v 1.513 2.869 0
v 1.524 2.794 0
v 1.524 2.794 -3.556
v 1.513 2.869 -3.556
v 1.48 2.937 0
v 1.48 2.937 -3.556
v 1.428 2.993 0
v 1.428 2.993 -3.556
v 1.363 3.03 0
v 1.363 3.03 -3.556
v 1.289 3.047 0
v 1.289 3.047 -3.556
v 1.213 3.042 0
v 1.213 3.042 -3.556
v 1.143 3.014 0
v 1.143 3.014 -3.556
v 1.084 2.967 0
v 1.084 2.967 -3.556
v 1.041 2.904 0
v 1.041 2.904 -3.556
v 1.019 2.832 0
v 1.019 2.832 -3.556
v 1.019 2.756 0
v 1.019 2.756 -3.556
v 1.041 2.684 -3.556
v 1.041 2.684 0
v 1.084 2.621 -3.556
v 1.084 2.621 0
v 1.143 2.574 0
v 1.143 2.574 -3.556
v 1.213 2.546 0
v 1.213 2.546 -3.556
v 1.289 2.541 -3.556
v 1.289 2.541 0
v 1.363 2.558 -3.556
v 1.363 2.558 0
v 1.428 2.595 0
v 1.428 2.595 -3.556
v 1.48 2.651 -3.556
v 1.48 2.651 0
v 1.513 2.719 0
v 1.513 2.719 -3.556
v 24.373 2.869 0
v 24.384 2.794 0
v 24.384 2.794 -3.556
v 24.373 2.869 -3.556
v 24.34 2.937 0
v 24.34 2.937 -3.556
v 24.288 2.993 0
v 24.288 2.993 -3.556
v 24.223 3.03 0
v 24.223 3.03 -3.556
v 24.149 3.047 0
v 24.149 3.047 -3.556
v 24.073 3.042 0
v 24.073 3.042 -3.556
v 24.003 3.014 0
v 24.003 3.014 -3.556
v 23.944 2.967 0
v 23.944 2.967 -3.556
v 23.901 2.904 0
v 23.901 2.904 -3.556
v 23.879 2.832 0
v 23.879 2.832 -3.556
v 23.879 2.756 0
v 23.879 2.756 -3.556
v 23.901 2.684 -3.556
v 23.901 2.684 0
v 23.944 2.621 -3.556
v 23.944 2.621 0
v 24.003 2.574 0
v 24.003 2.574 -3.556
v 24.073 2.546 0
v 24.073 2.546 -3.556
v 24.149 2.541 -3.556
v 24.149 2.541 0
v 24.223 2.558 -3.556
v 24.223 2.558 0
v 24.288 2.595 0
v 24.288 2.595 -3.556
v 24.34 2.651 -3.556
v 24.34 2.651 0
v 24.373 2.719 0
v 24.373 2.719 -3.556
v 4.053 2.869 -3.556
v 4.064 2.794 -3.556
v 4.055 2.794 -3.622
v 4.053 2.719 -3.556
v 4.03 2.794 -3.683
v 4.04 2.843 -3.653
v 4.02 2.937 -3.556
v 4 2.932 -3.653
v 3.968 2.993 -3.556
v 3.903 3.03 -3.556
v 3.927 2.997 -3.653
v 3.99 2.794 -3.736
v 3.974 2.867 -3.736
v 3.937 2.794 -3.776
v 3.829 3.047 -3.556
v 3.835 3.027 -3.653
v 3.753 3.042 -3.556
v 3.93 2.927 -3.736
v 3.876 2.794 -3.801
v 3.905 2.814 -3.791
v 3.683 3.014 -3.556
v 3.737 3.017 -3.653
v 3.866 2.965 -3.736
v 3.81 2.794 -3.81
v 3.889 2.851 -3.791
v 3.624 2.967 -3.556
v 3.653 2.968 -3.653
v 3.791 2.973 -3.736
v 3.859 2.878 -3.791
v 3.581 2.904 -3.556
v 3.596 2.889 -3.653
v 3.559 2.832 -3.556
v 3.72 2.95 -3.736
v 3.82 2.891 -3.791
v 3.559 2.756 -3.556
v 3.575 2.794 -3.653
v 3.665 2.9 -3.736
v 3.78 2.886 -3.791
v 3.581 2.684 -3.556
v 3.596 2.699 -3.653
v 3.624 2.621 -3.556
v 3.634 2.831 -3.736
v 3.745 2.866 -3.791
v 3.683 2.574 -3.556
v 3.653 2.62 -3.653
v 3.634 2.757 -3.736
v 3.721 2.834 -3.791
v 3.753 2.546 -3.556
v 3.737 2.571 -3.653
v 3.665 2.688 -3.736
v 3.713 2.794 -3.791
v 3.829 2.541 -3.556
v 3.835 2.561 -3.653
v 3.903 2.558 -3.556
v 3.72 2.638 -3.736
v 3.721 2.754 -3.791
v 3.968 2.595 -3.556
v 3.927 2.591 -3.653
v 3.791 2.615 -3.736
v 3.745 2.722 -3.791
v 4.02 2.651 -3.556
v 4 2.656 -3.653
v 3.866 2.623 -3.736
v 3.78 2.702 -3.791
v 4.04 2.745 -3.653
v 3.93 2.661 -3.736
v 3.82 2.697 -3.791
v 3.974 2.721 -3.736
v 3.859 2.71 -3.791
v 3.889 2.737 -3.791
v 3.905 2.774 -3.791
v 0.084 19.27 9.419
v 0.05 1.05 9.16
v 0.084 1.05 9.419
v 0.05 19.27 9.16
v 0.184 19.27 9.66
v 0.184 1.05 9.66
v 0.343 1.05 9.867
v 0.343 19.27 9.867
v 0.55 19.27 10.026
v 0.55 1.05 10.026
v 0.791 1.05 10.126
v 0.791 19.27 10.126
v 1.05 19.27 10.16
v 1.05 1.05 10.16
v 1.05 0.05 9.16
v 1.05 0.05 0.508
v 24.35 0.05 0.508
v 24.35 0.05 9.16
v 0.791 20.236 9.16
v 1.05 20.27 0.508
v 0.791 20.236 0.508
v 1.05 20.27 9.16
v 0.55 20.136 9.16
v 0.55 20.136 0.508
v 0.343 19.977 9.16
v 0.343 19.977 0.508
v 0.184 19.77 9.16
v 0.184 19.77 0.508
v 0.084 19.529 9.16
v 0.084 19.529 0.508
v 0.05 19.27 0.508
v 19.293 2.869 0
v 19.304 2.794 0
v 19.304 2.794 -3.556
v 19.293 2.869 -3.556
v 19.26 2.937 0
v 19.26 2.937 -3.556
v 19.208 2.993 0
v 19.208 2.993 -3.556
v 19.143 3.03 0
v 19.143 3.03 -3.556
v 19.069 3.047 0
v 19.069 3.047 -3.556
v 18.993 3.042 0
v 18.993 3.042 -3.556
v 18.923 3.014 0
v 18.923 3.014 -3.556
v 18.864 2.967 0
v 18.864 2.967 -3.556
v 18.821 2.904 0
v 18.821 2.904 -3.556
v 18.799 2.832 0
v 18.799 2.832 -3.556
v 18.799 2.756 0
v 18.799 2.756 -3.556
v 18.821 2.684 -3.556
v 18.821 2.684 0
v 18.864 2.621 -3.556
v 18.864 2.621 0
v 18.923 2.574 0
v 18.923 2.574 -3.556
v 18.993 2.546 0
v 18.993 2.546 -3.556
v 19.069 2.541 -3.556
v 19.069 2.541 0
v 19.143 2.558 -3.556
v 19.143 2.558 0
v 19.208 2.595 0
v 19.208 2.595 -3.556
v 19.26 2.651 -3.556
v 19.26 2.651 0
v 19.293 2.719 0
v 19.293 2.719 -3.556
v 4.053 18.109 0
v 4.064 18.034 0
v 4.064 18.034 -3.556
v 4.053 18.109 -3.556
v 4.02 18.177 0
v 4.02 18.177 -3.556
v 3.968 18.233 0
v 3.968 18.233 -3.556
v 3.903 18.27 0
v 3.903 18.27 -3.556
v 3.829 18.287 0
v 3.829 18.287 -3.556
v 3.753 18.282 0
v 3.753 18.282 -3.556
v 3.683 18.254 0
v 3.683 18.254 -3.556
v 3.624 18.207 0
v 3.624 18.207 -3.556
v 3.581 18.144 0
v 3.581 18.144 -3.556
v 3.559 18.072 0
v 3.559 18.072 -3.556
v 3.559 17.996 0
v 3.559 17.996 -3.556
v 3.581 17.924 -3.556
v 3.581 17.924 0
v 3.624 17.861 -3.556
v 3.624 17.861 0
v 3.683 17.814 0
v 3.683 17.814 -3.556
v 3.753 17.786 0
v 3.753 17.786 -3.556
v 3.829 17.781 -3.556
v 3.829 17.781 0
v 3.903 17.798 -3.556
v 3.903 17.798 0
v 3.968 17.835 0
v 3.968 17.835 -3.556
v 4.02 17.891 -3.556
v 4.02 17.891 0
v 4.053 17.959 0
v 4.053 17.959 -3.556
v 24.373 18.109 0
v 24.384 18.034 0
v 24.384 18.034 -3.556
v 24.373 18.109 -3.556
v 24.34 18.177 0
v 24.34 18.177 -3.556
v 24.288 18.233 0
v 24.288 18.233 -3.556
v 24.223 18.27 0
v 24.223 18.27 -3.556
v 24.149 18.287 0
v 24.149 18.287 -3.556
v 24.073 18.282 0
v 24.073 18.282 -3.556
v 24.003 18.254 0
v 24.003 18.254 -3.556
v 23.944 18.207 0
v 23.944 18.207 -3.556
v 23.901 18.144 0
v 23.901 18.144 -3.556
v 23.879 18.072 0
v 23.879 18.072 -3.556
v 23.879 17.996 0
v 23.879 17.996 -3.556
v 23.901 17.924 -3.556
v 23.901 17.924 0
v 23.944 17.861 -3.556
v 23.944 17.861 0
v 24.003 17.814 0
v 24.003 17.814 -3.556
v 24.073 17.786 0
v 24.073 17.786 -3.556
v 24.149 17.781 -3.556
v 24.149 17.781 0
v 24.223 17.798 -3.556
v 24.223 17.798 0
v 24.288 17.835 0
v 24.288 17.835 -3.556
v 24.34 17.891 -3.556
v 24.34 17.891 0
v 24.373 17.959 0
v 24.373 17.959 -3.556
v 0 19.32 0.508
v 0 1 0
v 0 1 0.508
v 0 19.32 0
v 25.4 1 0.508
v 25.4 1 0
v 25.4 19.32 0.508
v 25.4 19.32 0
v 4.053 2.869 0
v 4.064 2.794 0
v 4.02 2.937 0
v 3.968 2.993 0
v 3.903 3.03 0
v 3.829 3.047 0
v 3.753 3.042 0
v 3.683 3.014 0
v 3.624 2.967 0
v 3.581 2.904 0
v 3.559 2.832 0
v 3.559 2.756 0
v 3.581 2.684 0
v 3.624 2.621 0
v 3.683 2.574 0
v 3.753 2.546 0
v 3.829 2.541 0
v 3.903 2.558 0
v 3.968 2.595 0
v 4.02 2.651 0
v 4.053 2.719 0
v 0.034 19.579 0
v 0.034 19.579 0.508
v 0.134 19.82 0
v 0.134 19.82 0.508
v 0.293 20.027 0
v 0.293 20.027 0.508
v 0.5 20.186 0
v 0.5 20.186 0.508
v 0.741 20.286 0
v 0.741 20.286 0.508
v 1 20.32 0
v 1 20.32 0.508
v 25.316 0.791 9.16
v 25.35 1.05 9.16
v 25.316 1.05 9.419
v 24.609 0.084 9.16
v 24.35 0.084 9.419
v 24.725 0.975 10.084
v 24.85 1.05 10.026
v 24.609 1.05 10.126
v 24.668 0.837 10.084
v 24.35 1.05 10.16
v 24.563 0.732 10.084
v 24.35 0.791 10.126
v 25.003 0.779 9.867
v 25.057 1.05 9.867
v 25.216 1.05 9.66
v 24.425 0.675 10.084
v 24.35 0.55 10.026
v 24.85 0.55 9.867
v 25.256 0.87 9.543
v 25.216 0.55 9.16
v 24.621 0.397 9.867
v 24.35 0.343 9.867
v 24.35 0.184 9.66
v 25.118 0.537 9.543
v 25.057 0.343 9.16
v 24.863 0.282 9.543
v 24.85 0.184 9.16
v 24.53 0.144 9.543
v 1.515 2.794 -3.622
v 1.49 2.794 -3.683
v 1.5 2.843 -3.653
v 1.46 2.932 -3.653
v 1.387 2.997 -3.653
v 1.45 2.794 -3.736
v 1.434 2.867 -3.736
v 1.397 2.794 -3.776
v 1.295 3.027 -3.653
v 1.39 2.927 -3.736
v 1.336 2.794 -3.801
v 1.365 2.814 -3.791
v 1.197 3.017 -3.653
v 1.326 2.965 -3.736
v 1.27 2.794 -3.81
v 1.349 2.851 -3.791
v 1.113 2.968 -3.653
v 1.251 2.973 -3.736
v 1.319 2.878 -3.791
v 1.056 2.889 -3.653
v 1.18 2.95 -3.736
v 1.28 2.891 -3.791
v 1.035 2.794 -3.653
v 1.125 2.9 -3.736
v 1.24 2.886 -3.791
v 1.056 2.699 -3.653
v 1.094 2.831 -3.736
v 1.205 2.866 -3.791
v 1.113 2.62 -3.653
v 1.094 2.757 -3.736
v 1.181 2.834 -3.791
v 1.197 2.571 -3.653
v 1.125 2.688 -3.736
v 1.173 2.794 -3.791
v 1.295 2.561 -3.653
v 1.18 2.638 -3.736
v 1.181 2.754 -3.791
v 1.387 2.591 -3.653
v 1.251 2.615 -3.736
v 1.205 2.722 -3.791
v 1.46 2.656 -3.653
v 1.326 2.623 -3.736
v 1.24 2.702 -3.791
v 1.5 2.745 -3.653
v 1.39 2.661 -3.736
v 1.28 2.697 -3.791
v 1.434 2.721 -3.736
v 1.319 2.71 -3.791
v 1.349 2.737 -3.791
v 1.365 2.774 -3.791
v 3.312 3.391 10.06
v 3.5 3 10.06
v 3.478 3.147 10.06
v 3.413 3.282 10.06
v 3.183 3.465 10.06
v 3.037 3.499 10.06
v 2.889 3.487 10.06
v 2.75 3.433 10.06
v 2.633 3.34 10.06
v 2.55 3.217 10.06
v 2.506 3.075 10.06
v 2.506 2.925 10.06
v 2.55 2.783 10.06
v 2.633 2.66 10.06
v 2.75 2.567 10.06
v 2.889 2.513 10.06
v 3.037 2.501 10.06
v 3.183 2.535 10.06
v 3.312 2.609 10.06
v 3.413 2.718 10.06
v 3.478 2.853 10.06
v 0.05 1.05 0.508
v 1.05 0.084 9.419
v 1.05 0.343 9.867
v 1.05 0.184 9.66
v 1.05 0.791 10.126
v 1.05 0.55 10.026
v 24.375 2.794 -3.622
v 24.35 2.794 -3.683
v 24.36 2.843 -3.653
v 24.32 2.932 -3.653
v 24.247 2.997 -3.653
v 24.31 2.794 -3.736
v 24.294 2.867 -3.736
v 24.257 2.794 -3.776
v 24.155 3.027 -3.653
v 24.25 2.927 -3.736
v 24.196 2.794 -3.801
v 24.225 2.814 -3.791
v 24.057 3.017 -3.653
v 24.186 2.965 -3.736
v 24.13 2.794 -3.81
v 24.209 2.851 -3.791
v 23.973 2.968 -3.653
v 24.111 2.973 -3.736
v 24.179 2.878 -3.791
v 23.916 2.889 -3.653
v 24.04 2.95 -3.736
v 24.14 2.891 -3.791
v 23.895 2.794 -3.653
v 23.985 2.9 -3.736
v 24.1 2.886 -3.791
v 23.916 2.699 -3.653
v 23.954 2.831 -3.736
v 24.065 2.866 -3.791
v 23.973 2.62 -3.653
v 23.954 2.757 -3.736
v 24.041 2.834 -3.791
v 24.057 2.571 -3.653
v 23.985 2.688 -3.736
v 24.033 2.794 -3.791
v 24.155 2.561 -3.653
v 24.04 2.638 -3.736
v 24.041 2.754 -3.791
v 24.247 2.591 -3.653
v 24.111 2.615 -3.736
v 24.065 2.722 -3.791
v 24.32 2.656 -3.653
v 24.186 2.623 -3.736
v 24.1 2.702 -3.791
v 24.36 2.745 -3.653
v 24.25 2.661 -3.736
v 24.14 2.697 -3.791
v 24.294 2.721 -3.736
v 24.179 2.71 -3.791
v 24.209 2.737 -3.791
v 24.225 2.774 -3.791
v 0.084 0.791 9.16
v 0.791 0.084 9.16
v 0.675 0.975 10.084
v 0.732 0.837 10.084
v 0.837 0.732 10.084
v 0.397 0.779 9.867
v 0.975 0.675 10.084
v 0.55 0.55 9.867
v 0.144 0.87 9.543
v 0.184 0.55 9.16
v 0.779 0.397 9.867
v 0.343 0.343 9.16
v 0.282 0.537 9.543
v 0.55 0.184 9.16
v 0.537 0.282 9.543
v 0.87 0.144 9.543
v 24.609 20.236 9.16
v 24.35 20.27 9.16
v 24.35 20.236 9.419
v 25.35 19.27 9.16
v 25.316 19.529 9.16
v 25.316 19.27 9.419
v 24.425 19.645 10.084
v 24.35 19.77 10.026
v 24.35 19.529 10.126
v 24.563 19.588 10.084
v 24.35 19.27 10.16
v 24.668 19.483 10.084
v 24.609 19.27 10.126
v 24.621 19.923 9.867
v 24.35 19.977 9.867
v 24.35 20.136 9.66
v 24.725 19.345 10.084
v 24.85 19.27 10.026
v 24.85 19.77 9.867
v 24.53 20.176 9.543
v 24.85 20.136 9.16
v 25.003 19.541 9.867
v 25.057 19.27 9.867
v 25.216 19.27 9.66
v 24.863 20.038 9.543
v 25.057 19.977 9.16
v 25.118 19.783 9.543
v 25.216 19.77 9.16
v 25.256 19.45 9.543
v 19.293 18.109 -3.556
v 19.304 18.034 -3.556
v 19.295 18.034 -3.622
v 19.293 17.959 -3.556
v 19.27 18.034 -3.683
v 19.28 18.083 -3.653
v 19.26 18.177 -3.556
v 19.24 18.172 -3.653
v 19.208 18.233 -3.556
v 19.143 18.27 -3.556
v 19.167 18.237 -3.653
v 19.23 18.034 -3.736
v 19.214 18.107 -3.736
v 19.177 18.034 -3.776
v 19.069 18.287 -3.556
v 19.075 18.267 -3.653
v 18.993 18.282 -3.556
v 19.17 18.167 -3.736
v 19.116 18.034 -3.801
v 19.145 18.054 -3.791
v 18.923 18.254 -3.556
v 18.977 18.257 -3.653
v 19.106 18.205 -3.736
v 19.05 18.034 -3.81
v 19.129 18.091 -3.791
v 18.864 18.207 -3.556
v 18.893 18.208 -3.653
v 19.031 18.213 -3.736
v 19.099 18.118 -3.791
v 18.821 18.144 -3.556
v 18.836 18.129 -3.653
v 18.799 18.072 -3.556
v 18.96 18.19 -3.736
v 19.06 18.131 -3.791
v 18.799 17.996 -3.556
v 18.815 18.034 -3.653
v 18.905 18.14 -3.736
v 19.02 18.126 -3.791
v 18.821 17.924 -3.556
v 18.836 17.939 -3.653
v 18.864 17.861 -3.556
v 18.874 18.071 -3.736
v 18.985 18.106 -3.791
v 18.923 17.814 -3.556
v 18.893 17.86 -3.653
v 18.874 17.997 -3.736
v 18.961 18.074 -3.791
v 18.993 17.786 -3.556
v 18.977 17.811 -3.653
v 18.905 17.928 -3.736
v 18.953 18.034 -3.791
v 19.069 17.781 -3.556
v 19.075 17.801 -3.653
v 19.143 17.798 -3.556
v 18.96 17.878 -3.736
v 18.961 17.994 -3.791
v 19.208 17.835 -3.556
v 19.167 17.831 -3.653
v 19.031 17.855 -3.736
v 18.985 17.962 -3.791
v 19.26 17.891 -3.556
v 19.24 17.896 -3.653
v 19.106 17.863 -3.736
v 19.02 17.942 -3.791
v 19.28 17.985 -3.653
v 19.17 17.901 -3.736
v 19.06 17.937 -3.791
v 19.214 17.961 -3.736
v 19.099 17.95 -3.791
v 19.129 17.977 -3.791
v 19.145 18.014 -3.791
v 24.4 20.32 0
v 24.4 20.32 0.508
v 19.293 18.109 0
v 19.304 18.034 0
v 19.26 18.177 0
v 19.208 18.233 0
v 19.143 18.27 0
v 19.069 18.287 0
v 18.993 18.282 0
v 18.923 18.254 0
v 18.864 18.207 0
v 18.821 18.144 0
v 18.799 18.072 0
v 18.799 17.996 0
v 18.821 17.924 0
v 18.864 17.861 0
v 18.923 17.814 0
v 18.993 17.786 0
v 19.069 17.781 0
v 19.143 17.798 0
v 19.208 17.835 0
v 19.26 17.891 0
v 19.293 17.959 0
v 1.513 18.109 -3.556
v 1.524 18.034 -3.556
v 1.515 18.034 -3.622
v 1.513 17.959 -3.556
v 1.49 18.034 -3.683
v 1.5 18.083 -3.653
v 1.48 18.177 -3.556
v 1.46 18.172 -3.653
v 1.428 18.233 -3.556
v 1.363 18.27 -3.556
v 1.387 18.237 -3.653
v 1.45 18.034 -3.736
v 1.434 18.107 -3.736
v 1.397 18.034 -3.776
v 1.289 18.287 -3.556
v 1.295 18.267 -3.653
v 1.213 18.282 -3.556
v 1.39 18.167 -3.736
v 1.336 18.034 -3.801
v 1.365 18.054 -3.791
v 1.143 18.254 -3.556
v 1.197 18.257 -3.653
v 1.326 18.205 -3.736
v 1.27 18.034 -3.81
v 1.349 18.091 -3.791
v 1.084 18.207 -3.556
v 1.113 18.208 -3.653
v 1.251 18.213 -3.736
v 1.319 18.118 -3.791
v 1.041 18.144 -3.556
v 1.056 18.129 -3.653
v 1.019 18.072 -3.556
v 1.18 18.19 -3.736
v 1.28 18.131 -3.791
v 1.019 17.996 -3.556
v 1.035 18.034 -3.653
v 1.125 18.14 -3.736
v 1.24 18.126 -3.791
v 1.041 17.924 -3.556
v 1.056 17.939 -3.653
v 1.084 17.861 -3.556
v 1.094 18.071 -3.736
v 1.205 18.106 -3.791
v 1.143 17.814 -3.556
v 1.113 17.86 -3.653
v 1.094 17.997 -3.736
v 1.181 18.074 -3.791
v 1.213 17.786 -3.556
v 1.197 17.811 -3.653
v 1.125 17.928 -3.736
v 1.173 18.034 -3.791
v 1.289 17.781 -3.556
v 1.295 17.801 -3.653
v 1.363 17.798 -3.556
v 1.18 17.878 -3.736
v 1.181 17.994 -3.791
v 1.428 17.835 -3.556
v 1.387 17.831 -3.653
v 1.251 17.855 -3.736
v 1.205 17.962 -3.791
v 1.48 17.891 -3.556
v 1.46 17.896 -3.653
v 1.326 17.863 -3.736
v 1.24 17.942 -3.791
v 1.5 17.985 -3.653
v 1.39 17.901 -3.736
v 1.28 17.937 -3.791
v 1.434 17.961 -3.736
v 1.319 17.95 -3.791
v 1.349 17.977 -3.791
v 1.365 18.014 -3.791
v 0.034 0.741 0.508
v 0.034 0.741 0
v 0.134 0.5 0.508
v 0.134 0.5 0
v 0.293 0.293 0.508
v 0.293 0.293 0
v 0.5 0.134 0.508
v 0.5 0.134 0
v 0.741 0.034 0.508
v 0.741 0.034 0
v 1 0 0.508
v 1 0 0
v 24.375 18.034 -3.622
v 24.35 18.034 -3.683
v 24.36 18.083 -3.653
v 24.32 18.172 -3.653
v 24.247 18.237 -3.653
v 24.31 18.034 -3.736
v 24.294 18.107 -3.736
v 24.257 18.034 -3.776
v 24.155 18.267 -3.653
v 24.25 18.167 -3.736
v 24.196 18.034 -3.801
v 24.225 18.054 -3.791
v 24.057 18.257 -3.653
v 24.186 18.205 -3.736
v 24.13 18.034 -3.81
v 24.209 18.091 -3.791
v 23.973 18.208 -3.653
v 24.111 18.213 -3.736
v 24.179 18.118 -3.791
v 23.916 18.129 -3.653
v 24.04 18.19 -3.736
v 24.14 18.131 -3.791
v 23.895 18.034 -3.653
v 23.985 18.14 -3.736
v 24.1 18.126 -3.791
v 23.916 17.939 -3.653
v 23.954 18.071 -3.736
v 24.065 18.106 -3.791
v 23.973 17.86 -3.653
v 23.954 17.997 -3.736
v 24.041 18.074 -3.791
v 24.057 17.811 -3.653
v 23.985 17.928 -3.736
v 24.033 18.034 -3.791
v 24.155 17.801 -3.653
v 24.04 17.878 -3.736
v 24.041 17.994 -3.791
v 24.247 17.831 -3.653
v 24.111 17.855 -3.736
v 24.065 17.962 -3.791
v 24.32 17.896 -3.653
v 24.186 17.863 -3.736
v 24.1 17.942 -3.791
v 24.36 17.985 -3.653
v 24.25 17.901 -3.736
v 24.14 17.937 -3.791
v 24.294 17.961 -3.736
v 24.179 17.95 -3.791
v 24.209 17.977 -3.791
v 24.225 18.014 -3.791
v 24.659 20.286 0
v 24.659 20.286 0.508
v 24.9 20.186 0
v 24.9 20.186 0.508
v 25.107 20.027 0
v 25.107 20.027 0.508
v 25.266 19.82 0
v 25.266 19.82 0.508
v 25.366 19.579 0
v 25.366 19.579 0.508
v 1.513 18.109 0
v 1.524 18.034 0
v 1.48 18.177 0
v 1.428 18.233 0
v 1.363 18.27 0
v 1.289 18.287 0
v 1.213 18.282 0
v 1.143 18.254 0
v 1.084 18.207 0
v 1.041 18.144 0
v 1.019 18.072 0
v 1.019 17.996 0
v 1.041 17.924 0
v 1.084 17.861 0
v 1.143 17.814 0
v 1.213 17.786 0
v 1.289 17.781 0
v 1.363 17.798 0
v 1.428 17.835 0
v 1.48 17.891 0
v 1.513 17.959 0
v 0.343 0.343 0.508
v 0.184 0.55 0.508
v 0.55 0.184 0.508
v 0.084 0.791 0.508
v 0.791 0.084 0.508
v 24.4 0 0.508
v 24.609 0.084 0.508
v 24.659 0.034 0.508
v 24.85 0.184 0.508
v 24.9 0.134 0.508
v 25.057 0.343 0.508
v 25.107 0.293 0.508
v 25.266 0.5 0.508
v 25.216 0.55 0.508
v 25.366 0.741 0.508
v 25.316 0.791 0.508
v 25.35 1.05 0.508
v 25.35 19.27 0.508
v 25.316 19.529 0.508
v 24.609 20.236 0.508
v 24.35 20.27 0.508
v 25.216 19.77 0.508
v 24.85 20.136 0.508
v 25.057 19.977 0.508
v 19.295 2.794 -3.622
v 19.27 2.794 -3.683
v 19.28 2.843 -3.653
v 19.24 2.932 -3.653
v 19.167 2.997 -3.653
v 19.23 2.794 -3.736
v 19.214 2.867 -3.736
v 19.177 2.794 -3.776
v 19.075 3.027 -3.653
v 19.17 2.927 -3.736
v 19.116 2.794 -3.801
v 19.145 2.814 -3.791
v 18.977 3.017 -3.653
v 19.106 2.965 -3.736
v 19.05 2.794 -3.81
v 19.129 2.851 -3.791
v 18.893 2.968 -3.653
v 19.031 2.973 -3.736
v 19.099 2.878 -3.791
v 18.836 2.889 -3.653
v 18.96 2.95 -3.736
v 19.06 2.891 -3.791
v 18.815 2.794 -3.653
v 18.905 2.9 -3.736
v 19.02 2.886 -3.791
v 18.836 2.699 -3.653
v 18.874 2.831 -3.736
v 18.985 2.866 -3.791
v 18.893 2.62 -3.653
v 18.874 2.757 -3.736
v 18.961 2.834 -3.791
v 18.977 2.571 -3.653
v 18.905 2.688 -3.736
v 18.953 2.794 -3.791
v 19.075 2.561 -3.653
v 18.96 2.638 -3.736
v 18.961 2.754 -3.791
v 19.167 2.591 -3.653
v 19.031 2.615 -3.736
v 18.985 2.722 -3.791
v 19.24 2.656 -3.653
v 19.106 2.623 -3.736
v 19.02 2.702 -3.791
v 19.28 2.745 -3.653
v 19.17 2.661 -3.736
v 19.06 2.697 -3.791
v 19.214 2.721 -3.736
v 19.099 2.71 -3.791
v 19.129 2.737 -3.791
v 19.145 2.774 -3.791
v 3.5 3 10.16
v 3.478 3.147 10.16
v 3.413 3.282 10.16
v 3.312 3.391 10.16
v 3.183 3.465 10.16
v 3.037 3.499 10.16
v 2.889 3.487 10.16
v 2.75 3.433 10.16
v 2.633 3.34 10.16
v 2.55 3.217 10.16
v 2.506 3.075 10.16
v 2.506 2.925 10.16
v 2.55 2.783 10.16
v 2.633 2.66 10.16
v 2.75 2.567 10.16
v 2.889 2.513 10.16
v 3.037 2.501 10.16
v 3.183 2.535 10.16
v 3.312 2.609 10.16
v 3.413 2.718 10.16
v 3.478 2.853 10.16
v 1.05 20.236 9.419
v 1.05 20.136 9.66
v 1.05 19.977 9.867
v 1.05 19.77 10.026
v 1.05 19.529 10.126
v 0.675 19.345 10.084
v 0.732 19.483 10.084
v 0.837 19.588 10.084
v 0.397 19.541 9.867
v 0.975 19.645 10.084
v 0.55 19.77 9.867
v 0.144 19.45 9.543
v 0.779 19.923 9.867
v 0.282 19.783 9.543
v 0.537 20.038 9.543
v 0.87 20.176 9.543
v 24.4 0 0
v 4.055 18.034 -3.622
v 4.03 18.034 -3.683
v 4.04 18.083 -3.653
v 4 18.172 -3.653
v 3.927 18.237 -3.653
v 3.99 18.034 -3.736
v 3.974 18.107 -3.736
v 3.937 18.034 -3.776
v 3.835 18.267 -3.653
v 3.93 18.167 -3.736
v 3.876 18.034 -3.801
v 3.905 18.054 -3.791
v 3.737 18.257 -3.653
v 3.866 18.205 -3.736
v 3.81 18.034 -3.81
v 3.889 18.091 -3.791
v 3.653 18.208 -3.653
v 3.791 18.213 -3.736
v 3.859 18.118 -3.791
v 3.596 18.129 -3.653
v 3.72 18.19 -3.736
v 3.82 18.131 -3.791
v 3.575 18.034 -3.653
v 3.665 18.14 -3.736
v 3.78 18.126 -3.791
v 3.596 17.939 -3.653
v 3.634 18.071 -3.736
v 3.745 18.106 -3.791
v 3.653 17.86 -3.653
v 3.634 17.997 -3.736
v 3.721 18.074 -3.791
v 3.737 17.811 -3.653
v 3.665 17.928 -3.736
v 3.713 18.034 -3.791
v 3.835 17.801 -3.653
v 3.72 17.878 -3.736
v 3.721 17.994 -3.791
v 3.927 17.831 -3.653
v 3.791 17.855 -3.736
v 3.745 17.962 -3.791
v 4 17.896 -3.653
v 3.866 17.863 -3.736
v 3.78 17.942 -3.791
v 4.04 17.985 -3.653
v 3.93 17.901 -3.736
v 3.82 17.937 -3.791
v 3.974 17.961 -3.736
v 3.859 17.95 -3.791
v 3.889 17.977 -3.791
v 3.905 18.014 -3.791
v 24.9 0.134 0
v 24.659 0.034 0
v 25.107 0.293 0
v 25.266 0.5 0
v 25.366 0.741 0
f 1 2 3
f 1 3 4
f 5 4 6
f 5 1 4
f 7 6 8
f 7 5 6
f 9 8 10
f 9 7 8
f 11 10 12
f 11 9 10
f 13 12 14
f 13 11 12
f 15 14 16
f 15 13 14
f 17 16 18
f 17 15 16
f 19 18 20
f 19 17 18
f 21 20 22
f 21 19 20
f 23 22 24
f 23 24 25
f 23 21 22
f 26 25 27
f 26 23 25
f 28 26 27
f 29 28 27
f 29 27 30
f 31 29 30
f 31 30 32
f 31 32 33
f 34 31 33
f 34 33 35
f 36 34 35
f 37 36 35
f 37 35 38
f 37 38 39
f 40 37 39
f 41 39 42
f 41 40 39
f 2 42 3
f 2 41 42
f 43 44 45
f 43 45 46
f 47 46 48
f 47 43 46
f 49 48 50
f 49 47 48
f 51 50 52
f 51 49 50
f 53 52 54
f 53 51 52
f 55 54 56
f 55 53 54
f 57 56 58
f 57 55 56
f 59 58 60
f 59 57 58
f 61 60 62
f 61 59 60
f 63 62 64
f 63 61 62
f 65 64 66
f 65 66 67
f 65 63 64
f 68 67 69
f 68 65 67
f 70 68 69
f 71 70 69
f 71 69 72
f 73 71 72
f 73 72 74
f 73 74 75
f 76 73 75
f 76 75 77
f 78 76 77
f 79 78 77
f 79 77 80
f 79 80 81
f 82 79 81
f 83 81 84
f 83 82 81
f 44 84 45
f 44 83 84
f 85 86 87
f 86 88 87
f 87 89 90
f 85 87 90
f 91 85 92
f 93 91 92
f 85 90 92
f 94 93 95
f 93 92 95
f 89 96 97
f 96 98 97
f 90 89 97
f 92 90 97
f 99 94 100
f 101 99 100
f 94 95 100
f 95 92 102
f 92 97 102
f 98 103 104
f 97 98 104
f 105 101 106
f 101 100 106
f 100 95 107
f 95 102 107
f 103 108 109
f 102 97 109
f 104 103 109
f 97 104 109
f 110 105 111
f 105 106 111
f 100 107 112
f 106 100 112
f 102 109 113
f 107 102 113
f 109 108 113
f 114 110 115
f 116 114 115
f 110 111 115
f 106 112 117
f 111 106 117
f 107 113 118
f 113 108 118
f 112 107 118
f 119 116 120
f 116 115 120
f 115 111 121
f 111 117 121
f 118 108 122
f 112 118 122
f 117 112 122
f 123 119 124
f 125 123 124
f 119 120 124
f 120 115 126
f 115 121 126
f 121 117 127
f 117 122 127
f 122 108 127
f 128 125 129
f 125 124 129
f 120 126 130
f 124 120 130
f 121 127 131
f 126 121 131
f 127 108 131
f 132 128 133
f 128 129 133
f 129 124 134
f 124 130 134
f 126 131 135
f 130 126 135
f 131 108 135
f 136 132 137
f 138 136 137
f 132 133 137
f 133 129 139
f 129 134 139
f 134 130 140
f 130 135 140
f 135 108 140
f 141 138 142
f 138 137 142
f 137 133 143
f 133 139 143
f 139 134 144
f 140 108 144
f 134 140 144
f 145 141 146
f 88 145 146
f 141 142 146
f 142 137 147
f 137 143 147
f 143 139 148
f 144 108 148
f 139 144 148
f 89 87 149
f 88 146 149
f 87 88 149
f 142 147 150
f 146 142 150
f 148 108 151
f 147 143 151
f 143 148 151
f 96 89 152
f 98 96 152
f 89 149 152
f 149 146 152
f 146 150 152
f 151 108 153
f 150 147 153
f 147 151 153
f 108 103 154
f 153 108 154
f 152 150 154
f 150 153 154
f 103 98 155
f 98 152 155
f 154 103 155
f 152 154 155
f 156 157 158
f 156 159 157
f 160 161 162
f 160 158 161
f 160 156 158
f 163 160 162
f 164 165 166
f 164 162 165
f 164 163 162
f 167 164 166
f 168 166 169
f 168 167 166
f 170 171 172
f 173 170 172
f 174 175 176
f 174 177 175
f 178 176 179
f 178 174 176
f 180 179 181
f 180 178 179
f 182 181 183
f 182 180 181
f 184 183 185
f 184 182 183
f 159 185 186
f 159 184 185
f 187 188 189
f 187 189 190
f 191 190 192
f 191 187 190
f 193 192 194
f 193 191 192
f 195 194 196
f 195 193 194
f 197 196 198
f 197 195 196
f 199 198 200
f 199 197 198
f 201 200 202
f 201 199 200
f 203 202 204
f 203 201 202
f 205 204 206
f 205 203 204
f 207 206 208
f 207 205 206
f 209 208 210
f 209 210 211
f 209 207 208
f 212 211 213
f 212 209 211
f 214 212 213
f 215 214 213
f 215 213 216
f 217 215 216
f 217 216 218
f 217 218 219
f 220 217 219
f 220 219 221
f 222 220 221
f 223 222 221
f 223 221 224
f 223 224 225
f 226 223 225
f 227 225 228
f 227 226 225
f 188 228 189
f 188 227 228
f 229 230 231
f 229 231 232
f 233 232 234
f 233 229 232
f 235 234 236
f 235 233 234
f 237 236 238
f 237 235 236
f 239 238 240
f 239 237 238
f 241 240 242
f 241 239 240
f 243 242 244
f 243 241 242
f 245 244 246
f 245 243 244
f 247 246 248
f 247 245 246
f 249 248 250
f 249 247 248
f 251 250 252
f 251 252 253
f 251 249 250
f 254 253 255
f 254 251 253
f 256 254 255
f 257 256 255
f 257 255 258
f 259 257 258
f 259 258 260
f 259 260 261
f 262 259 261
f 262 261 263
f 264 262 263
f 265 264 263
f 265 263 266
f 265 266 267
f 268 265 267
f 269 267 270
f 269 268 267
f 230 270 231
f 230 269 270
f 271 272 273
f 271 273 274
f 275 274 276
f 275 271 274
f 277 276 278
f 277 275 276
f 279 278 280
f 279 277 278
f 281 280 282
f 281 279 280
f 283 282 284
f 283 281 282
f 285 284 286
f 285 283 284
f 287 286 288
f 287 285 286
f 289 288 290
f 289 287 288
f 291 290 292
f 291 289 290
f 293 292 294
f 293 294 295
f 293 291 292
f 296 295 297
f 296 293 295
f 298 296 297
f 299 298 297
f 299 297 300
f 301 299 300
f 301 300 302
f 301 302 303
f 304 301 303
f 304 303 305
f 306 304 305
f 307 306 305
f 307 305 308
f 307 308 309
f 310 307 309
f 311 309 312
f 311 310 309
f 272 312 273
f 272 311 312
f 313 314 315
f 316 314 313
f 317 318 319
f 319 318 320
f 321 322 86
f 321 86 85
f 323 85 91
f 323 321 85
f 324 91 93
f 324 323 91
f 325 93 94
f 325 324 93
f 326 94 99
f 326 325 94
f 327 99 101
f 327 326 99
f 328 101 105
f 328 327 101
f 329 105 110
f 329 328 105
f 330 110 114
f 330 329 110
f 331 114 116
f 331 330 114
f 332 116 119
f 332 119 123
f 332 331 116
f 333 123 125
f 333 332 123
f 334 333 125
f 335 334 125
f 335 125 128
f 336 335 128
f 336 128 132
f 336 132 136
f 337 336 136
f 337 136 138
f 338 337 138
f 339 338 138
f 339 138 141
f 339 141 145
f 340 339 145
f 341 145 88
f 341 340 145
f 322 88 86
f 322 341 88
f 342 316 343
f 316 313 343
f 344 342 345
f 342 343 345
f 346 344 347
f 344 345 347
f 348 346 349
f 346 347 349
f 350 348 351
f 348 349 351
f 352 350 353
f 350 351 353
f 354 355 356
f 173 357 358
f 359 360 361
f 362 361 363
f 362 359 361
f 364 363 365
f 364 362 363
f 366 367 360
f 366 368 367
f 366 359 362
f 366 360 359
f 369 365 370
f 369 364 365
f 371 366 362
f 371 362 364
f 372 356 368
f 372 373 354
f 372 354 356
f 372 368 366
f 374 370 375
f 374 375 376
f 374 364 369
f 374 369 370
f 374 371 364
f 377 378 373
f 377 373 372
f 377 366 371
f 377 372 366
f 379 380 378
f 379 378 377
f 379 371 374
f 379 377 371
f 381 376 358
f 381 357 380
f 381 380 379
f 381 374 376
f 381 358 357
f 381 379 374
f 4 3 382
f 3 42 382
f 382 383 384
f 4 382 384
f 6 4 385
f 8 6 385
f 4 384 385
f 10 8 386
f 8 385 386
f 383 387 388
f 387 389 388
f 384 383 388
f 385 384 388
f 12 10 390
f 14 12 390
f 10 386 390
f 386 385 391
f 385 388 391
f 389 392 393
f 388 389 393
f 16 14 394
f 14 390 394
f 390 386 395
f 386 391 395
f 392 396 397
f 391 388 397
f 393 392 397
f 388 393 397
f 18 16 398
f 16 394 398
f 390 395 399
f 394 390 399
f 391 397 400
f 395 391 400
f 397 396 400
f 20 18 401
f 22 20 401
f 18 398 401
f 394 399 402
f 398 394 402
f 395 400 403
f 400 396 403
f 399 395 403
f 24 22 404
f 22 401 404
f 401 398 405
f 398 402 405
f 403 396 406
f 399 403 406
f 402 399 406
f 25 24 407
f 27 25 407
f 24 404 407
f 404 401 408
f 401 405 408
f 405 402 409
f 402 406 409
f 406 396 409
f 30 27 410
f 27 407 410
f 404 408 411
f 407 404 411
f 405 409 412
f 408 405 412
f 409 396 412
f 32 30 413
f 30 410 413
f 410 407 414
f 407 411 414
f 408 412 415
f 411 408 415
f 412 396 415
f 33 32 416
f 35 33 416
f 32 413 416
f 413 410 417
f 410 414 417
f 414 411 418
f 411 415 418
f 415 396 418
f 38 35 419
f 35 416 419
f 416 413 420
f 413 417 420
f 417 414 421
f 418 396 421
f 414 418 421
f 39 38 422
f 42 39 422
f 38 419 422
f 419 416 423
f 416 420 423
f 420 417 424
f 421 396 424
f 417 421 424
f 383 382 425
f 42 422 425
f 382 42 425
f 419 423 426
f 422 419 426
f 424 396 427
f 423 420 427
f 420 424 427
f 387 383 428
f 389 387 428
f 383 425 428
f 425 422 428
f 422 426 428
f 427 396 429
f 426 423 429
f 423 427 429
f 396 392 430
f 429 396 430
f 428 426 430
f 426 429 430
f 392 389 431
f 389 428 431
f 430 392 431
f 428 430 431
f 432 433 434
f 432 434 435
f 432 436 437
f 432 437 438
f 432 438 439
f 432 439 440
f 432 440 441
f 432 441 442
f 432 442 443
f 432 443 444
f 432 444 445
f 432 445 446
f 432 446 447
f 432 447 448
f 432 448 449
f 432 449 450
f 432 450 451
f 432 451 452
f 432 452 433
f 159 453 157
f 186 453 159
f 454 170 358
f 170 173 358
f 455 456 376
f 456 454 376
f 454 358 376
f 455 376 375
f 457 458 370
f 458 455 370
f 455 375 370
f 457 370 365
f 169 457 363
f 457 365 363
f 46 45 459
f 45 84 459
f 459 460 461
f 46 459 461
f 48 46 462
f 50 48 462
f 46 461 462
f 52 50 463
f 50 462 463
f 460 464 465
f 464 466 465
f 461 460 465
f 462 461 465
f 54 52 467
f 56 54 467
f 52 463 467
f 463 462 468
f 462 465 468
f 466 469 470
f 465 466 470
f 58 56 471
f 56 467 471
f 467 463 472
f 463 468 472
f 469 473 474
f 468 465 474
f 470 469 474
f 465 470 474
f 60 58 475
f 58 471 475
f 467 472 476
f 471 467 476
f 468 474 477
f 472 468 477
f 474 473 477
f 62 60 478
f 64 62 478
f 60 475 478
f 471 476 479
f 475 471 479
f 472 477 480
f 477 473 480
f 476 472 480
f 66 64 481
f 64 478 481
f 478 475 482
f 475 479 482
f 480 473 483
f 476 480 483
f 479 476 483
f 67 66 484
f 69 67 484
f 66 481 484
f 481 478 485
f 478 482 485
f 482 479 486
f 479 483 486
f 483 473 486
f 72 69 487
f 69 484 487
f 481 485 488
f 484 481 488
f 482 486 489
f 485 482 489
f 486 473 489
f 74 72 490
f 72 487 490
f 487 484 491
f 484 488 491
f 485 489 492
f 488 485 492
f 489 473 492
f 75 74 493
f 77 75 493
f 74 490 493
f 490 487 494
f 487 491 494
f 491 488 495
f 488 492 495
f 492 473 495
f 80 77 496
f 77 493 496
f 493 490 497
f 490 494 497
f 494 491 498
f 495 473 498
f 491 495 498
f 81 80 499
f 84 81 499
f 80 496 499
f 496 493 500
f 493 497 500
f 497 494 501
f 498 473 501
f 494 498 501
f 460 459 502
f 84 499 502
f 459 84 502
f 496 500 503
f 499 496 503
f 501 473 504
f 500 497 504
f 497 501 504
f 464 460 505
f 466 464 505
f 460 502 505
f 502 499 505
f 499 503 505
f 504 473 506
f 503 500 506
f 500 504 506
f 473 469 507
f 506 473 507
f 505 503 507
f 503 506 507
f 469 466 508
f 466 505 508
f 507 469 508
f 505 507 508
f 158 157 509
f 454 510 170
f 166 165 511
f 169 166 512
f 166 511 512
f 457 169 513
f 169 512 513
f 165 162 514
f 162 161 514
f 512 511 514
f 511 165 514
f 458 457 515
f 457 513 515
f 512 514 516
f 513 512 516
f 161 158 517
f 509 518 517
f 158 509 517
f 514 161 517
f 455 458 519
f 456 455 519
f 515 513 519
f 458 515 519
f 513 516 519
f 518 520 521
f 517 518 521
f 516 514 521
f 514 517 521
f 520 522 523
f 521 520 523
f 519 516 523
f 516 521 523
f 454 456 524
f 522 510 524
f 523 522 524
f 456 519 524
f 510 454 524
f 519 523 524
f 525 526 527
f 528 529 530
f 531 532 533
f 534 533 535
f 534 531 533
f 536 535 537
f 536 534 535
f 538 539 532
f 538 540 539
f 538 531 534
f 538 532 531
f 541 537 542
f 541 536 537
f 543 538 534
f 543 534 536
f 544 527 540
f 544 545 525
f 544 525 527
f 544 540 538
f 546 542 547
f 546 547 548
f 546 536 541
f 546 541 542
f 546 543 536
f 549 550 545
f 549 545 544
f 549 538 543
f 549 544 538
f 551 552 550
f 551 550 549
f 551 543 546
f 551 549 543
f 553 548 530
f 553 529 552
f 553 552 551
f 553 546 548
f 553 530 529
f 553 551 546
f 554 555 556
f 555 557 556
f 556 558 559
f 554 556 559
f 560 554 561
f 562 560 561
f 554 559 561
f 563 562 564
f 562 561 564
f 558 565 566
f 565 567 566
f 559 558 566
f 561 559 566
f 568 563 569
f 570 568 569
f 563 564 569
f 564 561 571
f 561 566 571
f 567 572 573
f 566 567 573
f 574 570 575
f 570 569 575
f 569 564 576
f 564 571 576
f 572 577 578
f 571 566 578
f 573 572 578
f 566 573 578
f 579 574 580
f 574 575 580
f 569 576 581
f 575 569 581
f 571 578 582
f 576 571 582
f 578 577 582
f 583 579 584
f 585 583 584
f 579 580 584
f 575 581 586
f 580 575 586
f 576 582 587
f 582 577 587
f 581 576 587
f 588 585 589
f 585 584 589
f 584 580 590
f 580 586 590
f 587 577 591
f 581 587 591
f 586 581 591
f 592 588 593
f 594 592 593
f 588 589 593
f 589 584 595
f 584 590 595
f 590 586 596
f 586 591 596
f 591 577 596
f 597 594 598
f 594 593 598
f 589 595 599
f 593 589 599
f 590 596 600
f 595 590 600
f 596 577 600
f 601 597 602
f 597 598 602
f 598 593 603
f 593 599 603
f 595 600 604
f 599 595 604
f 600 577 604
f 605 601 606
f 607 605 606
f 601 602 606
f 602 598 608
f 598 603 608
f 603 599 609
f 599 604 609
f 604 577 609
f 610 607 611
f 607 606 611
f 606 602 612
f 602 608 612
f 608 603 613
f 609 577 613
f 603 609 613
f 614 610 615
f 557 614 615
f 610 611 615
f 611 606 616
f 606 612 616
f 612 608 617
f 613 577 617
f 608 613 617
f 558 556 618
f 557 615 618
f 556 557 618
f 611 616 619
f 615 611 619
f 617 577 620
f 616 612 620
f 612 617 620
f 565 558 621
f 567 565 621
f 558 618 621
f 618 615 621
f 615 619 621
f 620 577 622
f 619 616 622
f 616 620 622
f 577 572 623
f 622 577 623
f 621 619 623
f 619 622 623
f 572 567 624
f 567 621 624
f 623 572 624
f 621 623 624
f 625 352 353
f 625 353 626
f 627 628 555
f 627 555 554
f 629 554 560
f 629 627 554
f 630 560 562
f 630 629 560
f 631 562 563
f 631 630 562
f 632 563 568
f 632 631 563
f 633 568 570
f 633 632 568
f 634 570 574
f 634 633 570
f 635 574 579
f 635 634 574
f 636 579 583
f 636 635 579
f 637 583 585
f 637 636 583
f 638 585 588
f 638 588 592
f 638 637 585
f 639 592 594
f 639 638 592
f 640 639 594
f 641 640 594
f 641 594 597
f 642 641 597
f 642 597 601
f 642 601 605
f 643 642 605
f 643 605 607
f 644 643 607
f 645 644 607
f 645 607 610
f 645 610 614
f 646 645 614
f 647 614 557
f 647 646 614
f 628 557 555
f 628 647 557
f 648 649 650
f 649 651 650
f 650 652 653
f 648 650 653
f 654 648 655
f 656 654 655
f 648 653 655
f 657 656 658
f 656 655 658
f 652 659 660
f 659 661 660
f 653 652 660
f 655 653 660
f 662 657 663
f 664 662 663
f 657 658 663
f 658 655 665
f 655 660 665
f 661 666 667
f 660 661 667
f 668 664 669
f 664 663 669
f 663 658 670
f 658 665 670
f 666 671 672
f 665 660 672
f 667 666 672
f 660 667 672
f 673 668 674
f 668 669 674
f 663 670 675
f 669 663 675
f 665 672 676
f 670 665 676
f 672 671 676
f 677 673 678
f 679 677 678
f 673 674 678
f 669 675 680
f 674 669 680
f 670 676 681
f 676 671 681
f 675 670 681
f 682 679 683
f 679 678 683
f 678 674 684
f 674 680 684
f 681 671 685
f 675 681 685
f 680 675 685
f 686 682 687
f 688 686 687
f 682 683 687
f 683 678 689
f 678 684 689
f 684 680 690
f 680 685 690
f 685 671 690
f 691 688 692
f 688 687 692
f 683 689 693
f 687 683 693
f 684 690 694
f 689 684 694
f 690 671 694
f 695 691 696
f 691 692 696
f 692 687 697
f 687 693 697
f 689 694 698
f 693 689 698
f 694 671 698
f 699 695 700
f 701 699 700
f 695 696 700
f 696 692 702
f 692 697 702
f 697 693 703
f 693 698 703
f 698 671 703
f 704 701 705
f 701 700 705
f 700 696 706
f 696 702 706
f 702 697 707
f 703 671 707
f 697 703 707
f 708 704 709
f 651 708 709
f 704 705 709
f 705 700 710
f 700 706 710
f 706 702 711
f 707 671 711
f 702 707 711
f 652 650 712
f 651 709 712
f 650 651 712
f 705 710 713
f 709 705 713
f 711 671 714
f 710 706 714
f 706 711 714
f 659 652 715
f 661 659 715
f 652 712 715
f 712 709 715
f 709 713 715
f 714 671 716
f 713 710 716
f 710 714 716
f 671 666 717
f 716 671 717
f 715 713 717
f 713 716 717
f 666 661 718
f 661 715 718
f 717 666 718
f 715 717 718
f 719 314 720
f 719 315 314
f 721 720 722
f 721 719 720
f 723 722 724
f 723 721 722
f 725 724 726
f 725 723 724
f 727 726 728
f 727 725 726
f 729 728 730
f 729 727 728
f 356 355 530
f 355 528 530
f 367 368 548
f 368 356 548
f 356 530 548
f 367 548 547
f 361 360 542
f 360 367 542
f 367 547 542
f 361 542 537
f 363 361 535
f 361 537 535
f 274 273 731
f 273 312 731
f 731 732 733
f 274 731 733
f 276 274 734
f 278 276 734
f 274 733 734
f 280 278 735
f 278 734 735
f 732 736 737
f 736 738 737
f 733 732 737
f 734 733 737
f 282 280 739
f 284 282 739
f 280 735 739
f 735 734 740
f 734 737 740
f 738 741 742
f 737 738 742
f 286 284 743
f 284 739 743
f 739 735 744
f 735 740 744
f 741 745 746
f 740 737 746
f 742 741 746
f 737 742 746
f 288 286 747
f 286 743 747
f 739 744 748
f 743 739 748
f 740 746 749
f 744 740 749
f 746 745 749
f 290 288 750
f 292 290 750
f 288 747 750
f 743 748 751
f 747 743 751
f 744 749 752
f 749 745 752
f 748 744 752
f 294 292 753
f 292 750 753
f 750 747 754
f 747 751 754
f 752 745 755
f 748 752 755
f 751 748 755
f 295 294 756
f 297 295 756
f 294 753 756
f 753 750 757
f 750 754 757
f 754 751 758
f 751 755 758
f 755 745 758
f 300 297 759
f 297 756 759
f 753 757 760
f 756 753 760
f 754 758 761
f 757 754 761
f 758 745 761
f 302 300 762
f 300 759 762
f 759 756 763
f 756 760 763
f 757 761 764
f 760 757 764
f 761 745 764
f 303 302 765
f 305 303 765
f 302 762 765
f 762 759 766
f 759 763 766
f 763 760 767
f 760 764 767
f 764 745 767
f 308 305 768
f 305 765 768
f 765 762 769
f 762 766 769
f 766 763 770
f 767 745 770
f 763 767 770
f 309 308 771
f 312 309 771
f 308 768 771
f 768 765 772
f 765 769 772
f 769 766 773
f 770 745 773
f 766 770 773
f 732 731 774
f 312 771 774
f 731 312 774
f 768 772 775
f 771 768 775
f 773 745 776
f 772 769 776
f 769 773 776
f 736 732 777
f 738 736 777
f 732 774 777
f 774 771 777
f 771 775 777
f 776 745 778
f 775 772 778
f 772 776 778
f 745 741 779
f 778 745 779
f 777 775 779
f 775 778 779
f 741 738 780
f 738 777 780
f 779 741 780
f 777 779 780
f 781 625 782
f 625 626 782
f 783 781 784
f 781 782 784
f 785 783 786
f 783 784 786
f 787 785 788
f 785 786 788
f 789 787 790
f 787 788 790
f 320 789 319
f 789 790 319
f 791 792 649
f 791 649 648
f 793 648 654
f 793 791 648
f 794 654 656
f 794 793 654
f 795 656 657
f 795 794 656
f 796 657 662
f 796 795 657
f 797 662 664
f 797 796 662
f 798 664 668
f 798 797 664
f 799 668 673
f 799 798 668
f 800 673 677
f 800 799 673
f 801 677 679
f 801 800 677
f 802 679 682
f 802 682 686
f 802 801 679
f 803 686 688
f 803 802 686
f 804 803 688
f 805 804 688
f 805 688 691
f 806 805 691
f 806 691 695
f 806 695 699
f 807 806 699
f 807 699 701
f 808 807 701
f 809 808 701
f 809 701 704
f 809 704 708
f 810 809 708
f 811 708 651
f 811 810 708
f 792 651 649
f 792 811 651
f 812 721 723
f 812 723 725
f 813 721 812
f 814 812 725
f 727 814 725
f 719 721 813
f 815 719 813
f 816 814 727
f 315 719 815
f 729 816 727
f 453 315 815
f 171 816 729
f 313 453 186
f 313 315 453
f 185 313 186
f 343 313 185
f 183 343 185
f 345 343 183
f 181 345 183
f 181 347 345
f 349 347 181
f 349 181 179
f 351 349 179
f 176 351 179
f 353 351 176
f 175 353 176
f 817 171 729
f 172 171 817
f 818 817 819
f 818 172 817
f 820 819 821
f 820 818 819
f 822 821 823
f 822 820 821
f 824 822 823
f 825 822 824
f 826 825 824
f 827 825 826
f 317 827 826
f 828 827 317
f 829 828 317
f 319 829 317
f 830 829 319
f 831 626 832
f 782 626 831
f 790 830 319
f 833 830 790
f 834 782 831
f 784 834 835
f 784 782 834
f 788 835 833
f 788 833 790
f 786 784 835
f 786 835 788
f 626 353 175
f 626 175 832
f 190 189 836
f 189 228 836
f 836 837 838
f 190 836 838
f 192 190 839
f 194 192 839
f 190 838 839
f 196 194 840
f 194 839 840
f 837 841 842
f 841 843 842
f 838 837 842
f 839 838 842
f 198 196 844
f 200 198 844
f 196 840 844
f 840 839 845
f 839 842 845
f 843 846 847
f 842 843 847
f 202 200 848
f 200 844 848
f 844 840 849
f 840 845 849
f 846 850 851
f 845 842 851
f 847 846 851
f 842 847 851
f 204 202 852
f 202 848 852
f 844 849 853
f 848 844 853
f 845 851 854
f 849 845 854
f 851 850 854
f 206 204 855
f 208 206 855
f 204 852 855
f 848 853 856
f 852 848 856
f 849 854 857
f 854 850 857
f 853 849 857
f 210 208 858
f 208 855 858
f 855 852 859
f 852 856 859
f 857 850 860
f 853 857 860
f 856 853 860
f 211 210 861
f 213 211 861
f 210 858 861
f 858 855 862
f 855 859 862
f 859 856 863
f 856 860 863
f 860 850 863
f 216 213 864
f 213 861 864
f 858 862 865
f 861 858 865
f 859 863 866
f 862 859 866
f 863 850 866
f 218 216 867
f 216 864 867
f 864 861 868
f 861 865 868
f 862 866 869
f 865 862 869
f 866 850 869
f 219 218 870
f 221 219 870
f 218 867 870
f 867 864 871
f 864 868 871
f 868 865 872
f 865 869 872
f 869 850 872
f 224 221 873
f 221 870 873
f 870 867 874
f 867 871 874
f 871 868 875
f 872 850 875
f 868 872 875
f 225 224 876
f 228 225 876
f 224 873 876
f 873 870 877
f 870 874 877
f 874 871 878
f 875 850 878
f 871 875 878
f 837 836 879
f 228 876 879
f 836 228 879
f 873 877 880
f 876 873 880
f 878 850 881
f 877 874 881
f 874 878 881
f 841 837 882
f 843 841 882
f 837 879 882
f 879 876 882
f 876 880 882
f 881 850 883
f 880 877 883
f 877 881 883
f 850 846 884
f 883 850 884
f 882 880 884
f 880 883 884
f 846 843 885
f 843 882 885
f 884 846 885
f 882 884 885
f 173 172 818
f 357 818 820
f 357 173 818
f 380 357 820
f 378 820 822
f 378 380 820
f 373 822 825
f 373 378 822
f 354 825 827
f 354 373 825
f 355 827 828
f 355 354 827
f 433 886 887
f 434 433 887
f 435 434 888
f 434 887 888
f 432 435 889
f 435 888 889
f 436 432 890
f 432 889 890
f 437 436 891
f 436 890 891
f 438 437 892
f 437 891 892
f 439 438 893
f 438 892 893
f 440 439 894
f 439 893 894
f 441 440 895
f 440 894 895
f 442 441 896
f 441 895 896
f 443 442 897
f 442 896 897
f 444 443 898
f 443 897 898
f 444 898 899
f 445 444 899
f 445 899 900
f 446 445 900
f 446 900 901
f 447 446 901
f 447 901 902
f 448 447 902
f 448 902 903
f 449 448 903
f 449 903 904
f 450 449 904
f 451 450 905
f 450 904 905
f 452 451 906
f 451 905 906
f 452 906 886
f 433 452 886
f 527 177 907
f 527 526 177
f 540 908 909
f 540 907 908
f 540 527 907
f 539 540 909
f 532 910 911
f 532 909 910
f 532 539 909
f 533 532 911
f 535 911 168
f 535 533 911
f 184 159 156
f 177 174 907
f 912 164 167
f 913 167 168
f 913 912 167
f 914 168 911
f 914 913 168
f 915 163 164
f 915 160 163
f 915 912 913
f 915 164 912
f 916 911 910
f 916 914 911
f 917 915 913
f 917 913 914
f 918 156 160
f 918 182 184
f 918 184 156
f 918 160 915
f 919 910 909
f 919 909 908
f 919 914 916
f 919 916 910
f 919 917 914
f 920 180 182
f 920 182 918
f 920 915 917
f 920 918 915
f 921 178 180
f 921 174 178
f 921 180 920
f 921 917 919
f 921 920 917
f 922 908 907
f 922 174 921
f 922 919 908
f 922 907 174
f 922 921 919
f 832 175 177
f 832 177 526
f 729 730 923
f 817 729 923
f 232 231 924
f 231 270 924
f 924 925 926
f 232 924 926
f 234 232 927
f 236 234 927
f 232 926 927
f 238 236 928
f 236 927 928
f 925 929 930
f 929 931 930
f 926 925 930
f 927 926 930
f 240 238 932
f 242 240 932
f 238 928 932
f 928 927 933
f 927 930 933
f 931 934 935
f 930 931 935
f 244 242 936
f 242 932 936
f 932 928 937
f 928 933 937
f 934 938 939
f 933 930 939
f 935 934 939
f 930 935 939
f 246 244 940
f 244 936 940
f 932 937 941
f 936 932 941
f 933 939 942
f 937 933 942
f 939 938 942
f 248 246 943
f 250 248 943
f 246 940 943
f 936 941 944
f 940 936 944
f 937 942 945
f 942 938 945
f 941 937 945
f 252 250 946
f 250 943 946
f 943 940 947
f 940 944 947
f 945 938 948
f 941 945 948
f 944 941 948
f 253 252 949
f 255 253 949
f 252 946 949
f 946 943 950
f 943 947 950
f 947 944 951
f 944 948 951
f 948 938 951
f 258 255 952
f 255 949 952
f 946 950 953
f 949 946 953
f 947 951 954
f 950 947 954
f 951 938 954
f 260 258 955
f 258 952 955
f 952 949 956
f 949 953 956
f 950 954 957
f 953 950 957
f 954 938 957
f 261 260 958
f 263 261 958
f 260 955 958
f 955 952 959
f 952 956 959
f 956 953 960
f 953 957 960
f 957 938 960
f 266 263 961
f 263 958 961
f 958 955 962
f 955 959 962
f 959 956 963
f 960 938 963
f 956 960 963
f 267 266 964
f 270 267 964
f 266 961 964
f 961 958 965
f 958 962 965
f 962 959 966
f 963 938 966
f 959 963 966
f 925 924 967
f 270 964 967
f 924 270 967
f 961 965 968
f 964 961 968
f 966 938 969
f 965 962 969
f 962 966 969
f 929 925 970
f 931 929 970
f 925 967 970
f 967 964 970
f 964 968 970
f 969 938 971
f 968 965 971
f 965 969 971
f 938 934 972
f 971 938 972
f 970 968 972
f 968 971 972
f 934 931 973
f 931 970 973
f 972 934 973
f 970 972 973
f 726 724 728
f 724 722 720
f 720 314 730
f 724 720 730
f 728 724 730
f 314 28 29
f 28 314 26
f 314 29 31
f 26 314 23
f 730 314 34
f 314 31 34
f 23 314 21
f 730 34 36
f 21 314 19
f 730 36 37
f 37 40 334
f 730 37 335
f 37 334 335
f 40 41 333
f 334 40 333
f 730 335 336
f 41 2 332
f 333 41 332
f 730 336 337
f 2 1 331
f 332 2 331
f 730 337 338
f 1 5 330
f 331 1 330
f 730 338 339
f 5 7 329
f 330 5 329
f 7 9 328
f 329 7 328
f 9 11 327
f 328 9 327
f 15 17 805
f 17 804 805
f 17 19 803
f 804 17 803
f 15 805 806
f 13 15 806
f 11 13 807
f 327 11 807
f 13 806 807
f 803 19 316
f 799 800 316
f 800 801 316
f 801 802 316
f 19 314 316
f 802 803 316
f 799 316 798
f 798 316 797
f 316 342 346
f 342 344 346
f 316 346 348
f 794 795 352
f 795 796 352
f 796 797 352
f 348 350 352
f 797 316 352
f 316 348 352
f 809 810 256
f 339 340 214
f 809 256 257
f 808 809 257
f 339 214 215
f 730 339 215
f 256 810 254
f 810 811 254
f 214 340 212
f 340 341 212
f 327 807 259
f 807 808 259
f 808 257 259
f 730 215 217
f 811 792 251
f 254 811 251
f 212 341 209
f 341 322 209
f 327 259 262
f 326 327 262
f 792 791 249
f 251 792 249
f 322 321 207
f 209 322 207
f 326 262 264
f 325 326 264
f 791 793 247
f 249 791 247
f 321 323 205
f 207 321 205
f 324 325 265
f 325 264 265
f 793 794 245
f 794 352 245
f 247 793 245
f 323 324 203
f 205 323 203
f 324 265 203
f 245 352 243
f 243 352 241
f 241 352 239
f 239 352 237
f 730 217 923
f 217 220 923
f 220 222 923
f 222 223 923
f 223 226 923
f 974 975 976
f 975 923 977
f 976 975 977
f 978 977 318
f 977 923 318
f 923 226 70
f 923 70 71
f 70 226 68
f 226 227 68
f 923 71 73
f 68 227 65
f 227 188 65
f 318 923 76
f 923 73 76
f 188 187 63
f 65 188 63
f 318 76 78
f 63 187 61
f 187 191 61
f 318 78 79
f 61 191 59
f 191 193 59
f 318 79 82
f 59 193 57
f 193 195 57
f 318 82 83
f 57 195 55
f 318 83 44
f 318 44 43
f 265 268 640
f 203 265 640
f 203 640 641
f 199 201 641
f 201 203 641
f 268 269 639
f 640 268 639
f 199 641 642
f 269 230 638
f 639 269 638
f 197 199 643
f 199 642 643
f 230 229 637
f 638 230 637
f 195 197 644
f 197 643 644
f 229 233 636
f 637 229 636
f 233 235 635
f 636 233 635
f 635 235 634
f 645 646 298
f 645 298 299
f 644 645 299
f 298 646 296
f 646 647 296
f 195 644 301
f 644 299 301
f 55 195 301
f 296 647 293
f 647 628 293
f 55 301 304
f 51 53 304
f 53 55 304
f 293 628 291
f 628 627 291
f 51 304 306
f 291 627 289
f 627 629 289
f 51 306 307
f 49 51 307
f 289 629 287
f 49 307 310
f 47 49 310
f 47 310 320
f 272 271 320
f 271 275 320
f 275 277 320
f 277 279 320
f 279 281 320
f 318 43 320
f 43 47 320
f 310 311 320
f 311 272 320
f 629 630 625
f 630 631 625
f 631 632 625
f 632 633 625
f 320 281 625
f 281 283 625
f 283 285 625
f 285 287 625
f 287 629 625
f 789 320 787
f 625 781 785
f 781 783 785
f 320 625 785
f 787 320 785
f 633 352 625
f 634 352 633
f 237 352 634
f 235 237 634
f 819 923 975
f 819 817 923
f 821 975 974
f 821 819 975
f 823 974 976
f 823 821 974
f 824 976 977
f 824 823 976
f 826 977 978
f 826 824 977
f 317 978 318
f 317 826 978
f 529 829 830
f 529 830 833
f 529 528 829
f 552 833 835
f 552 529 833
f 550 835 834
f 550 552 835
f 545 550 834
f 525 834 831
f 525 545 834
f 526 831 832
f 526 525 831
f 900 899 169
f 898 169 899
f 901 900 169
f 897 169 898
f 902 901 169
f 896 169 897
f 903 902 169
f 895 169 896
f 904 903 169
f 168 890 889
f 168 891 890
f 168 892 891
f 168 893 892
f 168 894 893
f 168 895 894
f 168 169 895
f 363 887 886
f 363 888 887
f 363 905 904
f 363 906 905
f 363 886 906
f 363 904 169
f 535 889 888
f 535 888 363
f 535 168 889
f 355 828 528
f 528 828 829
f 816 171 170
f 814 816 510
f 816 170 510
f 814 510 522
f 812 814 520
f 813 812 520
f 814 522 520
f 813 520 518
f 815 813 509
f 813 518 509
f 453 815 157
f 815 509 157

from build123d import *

# Parameters (mm, degrees)
F0_W     = 25.4
F0_H     = 20.32
F1_DEPTH = 0.508
F2_W     = 25.3
F2_H     = 20.22
F3_DEPTH = 9.652
F4_R     = 0.5
F5_DEPTH = 0.1
F6_R     = 1
F7_R     = 0.254
F8_DEPTH = 3.81
F9_R     = 0.254


with BuildPart() as f1:
    # F0 (on Top) → F1 (new body)
    with BuildSketch(Plane.XY):
        with Locations((12.7, 10.16)):
            Rectangle(F0_W, F0_H)
    extrude(amount=F1_DEPTH)

    # F2 (on face) → F3 (join)
    with BuildSketch(Plane.XY.offset(0.508)):
        with Locations((12.7, 10.16)):
            Rectangle(F2_W, F2_H)
    extrude(amount=F3_DEPTH)

    # F4 (on face) → F5 (cut)
    with BuildSketch(Plane.XY.offset(10.16)):
        with Locations((3, 3)):
            Circle(F4_R)
    extrude(amount=-F5_DEPTH, mode=Mode.SUBTRACT)

    # F6
    f6_edges = [f1.edges().sort_by_distance(p)[0] for p in [
        (25.35, 0.05, 5.334),
        (25.35, 20.27, 5.334),
        (0.05, 0.05, 5.334),
        (0.05, 20.27, 5.334),
        (25.4, 0, 0.254),
        (25.4, 20.32, 0.254),
        (0, 0, 0.254),
        (0, 20.32, 0.254),
        (0.05, 10.16, 10.16),
        (12.7, 20.27, 10.16),
        (25.35, 10.16, 10.16),
        (12.7, 0.05, 10.16),
    ]]
    fillet(f6_edges, radius=F6_R)

    # F7 (on Top) → F8 (join)
    with BuildSketch(Plane.XY):
        with Locations((1.27, 2.794)):
            Circle(F7_R)
        with Locations((3.81, 2.794)):
            Circle(F7_R)
        with Locations((1.27, 18.034)):
            Circle(F7_R)
        with Locations((3.81, 18.034)):
            Circle(F7_R)
        with Locations((19.05, 18.034)):
            Circle(F7_R)
        with Locations((24.13, 18.034)):
            Circle(F7_R)
        with Locations((19.05, 2.794)):
            Circle(F7_R)
        with Locations((24.13, 2.794)):
            Circle(F7_R)
    extrude(amount=-F8_DEPTH)

    # F9
    f9_edges = [f1.edges().sort_by_distance(p)[0] for p in [
        (1.016, 2.794, -3.81),
        (3.556, 2.794, -3.81),
        (23.876, 2.794, -3.81),
        (18.796, 2.794, -3.81),
        (23.876, 18.034, -3.81),
        (18.796, 18.034, -3.81),
        (3.556, 18.034, -3.81),
        (1.016, 18.034, -3.81),
    ]]
    fillet(f9_edges, radius=F9_R)


solid = f1.part
